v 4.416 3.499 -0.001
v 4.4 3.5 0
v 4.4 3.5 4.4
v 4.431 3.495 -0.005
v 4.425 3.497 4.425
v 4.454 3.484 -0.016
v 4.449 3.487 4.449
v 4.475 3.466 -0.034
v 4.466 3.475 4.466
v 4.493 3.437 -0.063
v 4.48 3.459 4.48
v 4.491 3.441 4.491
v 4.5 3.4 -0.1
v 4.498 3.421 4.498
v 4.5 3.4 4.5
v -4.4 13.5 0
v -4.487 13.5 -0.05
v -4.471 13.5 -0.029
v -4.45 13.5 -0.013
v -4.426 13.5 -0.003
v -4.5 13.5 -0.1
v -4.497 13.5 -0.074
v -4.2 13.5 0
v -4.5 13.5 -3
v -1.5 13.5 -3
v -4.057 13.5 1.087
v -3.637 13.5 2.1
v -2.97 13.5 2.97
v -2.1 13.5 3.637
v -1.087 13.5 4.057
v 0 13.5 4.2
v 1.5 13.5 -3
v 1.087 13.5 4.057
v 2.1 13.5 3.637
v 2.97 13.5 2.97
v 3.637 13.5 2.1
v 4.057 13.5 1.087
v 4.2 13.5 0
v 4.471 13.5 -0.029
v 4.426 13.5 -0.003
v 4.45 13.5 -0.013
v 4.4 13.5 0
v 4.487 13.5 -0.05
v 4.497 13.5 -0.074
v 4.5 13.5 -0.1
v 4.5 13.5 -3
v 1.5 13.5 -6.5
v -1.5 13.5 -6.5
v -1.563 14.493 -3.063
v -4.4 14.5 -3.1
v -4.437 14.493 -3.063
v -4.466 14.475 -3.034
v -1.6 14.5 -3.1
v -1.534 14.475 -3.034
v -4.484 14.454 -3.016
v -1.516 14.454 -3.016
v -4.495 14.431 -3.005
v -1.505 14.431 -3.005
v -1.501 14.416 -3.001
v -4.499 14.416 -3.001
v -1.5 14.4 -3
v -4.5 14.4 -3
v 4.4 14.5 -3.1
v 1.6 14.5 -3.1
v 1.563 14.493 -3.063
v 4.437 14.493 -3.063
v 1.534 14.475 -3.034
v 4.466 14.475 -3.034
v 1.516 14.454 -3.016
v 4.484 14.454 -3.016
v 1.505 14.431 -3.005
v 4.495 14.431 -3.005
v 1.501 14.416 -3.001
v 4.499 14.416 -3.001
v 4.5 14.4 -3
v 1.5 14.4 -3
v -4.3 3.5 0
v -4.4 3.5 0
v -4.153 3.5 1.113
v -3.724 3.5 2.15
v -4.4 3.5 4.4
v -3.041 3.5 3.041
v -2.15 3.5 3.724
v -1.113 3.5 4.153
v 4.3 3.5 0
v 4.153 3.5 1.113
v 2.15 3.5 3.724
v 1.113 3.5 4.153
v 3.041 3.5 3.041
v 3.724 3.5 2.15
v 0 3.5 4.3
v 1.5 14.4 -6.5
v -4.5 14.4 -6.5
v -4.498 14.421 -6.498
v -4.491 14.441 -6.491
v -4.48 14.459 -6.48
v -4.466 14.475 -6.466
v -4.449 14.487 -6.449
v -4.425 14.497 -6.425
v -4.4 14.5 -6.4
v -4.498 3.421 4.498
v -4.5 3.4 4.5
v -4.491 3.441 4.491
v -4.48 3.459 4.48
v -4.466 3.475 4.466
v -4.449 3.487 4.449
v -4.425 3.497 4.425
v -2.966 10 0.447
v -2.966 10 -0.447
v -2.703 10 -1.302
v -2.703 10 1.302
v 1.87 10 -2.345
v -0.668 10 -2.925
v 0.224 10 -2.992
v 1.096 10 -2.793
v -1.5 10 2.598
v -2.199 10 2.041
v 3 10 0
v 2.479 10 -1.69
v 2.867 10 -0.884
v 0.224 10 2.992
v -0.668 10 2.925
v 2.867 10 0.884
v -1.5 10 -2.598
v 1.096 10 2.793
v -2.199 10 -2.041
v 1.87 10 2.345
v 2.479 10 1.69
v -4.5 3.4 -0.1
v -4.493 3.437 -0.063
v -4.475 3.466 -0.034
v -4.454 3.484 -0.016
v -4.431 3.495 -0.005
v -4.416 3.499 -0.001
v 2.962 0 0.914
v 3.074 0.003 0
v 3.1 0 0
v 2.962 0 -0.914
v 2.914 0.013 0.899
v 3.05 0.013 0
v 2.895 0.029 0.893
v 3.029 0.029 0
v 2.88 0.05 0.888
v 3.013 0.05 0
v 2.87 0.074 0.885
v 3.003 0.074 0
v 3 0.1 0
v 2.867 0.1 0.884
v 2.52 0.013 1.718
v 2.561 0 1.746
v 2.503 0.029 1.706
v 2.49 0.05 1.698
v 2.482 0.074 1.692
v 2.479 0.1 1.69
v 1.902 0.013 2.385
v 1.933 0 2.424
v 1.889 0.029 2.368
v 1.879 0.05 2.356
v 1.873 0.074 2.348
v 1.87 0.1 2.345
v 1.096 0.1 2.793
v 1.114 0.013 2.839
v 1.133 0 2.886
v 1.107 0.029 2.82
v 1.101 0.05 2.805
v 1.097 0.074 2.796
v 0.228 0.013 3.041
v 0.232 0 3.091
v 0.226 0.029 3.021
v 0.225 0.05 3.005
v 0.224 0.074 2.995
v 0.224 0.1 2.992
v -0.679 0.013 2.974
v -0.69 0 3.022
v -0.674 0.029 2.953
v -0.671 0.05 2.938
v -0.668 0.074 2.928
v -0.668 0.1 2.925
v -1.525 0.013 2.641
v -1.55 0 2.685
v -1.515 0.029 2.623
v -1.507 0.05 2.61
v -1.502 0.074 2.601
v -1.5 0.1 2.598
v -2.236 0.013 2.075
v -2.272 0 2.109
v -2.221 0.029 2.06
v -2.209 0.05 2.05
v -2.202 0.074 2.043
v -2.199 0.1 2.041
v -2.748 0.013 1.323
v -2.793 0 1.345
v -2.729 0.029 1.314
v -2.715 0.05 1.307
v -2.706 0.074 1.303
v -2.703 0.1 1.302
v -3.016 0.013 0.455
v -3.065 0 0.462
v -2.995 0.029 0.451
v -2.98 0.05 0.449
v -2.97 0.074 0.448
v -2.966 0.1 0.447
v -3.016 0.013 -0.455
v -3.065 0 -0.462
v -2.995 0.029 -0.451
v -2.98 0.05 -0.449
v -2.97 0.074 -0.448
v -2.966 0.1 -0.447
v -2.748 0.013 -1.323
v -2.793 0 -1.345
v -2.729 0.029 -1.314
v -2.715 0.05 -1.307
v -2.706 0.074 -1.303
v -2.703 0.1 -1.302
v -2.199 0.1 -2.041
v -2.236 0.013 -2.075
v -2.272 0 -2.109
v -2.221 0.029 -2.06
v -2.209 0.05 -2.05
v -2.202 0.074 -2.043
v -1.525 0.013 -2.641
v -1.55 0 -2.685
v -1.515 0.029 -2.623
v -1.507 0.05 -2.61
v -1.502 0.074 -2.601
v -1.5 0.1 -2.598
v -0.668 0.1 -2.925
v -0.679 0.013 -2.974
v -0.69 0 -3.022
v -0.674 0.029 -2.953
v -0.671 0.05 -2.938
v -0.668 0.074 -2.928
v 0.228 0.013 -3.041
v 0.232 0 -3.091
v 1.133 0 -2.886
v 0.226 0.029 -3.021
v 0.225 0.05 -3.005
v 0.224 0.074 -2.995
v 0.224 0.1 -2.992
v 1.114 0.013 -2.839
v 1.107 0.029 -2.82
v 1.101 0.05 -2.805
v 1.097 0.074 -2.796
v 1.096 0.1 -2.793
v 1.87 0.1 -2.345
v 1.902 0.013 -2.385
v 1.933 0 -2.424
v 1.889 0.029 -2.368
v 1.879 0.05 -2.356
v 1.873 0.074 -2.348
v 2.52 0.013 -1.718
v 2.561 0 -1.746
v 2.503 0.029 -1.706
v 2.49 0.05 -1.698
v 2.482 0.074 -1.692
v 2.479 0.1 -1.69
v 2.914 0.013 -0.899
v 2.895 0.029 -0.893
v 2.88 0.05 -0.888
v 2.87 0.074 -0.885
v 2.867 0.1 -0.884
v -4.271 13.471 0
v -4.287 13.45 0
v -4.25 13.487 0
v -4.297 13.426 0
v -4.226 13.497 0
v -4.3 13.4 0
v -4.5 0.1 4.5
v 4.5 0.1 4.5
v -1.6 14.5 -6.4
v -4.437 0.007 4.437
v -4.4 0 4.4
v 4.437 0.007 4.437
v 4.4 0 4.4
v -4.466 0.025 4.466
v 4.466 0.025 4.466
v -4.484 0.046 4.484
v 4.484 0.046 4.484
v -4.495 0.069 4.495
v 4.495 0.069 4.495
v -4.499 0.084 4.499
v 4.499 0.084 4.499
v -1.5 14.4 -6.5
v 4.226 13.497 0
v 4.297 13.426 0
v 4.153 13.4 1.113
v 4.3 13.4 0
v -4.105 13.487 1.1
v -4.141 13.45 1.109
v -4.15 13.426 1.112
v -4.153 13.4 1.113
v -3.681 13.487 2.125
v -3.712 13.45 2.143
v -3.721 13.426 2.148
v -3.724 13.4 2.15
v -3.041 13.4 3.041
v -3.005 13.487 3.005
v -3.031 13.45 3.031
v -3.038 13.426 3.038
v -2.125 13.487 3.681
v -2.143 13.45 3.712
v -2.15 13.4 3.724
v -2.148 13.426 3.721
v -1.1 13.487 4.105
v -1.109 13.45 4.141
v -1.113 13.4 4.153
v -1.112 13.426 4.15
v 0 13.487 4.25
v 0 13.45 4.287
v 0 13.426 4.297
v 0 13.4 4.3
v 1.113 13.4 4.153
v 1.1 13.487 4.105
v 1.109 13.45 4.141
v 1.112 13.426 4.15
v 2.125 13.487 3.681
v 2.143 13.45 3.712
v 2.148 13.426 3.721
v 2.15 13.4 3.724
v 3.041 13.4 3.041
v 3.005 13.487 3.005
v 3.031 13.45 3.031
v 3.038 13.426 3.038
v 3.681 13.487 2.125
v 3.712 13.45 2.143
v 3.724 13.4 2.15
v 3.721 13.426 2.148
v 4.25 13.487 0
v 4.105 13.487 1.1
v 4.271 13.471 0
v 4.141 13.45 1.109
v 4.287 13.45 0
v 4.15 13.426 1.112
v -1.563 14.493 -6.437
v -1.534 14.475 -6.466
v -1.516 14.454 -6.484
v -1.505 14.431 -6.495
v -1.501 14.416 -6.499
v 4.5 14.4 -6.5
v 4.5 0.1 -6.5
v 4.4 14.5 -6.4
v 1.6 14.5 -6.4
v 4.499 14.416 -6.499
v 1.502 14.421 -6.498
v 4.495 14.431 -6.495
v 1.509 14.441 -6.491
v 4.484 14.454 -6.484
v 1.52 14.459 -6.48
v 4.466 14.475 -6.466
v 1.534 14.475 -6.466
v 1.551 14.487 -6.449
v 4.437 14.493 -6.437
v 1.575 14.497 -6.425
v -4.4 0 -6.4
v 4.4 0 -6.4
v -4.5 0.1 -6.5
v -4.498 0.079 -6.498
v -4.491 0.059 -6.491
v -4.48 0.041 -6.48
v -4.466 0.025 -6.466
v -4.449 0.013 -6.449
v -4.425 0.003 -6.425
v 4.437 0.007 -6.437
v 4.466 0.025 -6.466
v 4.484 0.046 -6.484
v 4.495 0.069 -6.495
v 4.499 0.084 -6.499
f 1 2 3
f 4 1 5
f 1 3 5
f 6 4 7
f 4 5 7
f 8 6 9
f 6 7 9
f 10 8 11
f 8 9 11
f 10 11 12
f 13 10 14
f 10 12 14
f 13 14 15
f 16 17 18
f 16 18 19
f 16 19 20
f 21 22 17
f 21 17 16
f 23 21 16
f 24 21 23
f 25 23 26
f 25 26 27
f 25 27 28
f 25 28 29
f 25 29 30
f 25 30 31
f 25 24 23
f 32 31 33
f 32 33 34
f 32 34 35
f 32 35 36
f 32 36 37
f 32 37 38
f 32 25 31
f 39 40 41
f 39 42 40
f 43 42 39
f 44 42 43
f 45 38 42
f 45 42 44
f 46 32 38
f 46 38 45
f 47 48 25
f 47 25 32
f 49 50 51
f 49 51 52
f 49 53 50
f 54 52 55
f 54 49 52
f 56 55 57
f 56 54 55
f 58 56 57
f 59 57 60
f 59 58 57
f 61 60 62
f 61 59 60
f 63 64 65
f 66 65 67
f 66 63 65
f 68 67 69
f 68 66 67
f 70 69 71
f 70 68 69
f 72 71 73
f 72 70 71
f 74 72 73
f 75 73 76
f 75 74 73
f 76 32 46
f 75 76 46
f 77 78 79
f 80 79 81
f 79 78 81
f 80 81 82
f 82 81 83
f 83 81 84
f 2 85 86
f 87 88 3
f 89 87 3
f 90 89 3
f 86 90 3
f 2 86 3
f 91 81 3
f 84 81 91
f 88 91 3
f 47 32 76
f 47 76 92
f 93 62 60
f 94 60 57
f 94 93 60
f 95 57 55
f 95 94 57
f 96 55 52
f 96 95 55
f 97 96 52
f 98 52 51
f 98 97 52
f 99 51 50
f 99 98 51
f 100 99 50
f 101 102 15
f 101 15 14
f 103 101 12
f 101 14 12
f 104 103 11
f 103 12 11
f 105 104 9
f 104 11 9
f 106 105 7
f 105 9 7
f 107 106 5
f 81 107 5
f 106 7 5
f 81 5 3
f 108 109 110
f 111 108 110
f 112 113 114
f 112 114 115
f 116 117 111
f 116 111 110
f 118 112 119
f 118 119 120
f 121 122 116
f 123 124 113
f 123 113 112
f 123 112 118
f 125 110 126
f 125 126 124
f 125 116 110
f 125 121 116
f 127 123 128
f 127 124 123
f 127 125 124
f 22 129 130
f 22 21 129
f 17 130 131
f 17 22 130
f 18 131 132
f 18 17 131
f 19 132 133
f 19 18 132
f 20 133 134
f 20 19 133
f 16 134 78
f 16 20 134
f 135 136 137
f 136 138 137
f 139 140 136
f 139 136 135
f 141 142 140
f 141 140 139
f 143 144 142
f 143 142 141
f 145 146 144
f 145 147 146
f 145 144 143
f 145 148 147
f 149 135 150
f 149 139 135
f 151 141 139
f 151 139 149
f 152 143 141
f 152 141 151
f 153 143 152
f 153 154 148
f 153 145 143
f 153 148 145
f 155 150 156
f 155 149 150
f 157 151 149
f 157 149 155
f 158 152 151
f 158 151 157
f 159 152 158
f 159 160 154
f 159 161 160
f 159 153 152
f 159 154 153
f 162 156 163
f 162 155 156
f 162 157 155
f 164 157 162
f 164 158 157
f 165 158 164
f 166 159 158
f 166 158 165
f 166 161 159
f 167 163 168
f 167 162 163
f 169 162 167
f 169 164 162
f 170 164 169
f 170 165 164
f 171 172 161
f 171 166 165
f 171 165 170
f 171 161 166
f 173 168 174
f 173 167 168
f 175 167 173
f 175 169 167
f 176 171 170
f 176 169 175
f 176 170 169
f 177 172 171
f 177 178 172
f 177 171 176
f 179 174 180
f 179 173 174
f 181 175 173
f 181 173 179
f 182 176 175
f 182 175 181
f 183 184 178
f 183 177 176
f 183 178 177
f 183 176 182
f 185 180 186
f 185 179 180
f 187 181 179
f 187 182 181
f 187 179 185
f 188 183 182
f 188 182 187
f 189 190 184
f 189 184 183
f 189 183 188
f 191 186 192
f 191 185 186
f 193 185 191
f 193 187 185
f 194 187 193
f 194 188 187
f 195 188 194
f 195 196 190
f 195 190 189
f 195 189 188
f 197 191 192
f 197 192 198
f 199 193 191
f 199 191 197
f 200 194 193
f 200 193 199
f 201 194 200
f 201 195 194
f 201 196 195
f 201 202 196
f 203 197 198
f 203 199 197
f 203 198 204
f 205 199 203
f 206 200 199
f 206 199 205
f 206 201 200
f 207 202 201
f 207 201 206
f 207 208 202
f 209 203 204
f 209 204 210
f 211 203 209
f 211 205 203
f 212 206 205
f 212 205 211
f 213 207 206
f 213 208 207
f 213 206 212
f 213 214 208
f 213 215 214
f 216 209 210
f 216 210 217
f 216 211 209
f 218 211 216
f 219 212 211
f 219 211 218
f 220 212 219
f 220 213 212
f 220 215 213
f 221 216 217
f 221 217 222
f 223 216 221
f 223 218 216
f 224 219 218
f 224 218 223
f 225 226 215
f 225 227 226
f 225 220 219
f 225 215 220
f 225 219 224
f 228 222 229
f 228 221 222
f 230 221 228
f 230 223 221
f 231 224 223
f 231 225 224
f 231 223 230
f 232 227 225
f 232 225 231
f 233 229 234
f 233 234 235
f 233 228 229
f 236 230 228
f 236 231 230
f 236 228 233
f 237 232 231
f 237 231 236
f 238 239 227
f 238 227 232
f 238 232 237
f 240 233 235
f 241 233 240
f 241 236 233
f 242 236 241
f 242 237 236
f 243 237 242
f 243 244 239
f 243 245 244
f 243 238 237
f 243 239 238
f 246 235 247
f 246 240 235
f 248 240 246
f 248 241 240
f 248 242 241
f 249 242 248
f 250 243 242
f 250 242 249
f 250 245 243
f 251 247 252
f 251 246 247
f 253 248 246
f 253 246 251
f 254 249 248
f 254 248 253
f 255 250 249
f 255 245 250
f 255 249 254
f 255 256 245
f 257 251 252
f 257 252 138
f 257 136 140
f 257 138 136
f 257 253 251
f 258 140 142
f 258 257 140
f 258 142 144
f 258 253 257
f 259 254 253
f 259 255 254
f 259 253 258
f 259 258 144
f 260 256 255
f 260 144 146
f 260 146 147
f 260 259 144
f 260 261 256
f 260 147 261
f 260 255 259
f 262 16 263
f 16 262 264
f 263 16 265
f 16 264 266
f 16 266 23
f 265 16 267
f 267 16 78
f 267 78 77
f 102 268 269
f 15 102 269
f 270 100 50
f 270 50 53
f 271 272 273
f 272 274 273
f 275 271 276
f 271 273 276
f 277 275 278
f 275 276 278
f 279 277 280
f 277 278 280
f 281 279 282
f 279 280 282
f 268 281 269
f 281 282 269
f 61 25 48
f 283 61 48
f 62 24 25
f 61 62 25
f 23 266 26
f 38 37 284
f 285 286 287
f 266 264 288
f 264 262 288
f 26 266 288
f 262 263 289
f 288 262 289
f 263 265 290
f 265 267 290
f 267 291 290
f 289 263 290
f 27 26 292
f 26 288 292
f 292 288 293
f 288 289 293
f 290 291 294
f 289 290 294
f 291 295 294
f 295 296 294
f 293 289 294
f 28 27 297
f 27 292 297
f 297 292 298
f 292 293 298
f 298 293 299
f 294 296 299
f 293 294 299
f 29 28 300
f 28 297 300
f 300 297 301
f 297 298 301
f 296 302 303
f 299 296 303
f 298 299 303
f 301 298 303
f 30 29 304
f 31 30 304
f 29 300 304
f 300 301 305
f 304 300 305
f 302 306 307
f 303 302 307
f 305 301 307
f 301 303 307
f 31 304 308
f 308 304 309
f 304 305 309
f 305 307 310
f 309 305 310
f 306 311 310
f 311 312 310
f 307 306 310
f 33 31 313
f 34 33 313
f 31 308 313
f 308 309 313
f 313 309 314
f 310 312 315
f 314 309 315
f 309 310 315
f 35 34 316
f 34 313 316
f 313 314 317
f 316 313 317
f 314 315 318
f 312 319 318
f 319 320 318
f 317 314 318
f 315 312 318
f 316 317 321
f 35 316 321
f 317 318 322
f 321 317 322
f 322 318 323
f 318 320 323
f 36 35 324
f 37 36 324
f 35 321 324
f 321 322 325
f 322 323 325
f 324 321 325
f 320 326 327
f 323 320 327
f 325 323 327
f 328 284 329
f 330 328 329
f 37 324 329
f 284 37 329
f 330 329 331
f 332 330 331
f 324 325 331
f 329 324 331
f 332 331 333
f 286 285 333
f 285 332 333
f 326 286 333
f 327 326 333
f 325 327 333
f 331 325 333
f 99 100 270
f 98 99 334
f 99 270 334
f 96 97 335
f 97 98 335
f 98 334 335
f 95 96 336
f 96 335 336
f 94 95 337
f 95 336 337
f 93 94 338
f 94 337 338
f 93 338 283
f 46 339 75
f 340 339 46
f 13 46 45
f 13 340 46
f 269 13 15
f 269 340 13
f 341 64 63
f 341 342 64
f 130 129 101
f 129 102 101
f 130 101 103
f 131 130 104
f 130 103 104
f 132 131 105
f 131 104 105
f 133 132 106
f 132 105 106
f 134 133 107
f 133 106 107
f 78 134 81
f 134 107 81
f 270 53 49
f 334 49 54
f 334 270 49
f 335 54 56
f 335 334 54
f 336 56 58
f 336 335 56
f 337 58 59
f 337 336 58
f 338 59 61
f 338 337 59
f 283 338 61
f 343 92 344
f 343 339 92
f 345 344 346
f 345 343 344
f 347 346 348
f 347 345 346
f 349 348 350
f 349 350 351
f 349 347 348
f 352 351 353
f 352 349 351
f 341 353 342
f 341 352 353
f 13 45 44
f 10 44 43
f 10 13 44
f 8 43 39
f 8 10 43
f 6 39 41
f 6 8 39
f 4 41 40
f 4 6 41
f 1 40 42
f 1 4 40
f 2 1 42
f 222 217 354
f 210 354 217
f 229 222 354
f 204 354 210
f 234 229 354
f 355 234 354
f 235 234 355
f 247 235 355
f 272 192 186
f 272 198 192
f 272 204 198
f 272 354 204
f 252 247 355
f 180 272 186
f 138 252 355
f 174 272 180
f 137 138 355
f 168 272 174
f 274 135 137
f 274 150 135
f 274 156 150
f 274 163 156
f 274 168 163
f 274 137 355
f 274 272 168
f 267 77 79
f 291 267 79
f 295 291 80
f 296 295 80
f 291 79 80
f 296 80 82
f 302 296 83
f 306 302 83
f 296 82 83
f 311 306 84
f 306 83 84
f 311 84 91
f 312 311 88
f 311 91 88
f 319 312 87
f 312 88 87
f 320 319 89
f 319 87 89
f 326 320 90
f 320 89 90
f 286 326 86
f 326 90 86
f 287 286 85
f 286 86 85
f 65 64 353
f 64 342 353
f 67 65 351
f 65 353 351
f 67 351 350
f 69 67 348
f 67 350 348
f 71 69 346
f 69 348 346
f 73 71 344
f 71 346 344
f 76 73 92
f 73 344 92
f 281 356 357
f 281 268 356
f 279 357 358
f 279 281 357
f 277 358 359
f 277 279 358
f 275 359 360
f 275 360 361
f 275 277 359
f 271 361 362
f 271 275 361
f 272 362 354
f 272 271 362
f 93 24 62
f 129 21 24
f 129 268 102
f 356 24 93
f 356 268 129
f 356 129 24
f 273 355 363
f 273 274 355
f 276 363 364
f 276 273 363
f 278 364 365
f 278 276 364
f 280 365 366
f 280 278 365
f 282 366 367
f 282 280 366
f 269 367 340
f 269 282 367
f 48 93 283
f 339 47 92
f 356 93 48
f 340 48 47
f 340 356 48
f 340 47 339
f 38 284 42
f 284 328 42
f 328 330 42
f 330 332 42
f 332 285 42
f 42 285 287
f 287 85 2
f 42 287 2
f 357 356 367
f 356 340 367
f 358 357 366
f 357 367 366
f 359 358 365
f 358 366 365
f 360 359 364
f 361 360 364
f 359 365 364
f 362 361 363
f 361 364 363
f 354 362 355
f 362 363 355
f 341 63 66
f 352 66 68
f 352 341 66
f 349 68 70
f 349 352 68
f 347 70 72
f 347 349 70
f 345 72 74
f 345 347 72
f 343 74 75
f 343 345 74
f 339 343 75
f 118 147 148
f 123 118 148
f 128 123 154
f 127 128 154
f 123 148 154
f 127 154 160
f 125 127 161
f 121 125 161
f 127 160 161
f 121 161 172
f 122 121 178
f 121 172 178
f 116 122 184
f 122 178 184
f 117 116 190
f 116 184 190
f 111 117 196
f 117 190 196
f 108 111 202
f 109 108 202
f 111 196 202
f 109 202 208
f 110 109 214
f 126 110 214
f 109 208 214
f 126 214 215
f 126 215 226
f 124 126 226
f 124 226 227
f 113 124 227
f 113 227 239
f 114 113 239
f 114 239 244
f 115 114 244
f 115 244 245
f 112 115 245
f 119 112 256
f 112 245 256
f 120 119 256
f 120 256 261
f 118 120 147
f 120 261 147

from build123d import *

# Parameters (mm, degrees)
SKETCH_W     = 9
SKETCH_H     = 11
PAD_DEPTH    = 3.5
PAD001_DEPTH = 10
SKETCH003_W  = 3
SKETCH003_H  = 3.5
PAD002_DEPTH = 1
SKETCH004_R  = 3
POCKET_DEPTH = 10
FILLET_R     = 0.1
FILLET002_R  = 0.1
FILLET003_R  = 0.1
FILLET004_R  = 0.1
FILLET006_R  = 0.1


with BuildPart() as part:
    # Sketch → Pad (new body)
    with BuildSketch(Plane.XZ):
        with Locations((0, -1)):
            Rectangle(SKETCH_W, SKETCH_H)
    extrude(amount=-PAD_DEPTH)

    # Sketch001 (on Face6 of Pad) → Pad001 (join)
    with BuildSketch(Plane(origin=(0, 3.5, 0), x_dir=(1, 0, 0), z_dir=(0, 1, 0))):
        with BuildLine():
            ThreePointArc((-4.3, 0), (0, -4.3), (4.3, 0))
            Line((4.3, 0), (4.5, 0))
            Line((4.5, 6.5), (4.5, 0))
            Line((-4.5, 6.5), (4.5, 6.5))
            Line((-4.5, 0), (-4.5, 6.5))
            Line((-4.5, 0), (-4.3, 0))
        make_face()
    extrude(amount=PAD001_DEPTH)

    # Sketch003 → Pad002 (join)
    with BuildSketch(Plane(origin=(0, 13.5, 0), x_dir=(1, 0, 0), z_dir=(0, 1, 0))):
        with Locations((-3, 4.75)):
            Rectangle(SKETCH003_W, SKETCH003_H)
        with Locations((3, 4.75)):
            Rectangle(SKETCH003_W, SKETCH003_H)
    extrude(amount=PAD002_DEPTH)

    # Sketch004 (on Face4 of Pad002) → Pocket (cut)
    with BuildSketch(Plane.XZ):
        Circle(SKETCH004_R)
    extrude(amount=-POCKET_DEPTH, mode=Mode.SUBTRACT)

    # Fillet
    fillet_edges = [part.edges().sort_by_distance(p)[0] for p in [
        (0, 0, 4.5),
        (4.5, 0, -1),
        (0, 0, -6.5),
        (-4.5, 0, -1),
        (0, 3.5, 4.5),
        (4.5, 3.5, 2.25),
        (-4.5, 3.5, 2.25),
    ]]
    fillet(fillet_edges, radius=FILLET_R)

    # Fillet002
    fillet002_edges = [part.edges().sort_by_distance(p)[0] for p in [
        (0, 13.5, 4.3),
    ]]
    fillet(fillet002_edges, radius=FILLET002_R)

    # Fillet003
    fillet003_edges = [part.edges().sort_by_distance(p)[0] for p in [
        (3, 14.5, -3),
        (4.5, 14.5, -4.75),
        (3, 14.5, -6.5),
        (1.5, 14.5, -4.75),
        (-1.5, 14.5, -4.75),
        (-3, 14.5, -3),
        (-4.5, 14.5, -4.75),
        (-3, 14.5, -6.5),
    ]]
    fillet(fillet003_edges, radius=FILLET003_R)

    # Fillet004
    fillet004_edges = [part.edges().sort_by_distance(p)[0] for p in [
        (-4.5, 8.5, 0),
        (4.5, 8.5, 0),
    ]]
    fillet(fillet004_edges, radius=FILLET004_R)

    # Fillet006
    fillet006_edges = [part.edges().sort_by_distance(p)[0] for p in [
        (-3, 0, 0),
    ]]
    fillet(fillet006_edges, radius=FILLET006_R)


solid = part.part
